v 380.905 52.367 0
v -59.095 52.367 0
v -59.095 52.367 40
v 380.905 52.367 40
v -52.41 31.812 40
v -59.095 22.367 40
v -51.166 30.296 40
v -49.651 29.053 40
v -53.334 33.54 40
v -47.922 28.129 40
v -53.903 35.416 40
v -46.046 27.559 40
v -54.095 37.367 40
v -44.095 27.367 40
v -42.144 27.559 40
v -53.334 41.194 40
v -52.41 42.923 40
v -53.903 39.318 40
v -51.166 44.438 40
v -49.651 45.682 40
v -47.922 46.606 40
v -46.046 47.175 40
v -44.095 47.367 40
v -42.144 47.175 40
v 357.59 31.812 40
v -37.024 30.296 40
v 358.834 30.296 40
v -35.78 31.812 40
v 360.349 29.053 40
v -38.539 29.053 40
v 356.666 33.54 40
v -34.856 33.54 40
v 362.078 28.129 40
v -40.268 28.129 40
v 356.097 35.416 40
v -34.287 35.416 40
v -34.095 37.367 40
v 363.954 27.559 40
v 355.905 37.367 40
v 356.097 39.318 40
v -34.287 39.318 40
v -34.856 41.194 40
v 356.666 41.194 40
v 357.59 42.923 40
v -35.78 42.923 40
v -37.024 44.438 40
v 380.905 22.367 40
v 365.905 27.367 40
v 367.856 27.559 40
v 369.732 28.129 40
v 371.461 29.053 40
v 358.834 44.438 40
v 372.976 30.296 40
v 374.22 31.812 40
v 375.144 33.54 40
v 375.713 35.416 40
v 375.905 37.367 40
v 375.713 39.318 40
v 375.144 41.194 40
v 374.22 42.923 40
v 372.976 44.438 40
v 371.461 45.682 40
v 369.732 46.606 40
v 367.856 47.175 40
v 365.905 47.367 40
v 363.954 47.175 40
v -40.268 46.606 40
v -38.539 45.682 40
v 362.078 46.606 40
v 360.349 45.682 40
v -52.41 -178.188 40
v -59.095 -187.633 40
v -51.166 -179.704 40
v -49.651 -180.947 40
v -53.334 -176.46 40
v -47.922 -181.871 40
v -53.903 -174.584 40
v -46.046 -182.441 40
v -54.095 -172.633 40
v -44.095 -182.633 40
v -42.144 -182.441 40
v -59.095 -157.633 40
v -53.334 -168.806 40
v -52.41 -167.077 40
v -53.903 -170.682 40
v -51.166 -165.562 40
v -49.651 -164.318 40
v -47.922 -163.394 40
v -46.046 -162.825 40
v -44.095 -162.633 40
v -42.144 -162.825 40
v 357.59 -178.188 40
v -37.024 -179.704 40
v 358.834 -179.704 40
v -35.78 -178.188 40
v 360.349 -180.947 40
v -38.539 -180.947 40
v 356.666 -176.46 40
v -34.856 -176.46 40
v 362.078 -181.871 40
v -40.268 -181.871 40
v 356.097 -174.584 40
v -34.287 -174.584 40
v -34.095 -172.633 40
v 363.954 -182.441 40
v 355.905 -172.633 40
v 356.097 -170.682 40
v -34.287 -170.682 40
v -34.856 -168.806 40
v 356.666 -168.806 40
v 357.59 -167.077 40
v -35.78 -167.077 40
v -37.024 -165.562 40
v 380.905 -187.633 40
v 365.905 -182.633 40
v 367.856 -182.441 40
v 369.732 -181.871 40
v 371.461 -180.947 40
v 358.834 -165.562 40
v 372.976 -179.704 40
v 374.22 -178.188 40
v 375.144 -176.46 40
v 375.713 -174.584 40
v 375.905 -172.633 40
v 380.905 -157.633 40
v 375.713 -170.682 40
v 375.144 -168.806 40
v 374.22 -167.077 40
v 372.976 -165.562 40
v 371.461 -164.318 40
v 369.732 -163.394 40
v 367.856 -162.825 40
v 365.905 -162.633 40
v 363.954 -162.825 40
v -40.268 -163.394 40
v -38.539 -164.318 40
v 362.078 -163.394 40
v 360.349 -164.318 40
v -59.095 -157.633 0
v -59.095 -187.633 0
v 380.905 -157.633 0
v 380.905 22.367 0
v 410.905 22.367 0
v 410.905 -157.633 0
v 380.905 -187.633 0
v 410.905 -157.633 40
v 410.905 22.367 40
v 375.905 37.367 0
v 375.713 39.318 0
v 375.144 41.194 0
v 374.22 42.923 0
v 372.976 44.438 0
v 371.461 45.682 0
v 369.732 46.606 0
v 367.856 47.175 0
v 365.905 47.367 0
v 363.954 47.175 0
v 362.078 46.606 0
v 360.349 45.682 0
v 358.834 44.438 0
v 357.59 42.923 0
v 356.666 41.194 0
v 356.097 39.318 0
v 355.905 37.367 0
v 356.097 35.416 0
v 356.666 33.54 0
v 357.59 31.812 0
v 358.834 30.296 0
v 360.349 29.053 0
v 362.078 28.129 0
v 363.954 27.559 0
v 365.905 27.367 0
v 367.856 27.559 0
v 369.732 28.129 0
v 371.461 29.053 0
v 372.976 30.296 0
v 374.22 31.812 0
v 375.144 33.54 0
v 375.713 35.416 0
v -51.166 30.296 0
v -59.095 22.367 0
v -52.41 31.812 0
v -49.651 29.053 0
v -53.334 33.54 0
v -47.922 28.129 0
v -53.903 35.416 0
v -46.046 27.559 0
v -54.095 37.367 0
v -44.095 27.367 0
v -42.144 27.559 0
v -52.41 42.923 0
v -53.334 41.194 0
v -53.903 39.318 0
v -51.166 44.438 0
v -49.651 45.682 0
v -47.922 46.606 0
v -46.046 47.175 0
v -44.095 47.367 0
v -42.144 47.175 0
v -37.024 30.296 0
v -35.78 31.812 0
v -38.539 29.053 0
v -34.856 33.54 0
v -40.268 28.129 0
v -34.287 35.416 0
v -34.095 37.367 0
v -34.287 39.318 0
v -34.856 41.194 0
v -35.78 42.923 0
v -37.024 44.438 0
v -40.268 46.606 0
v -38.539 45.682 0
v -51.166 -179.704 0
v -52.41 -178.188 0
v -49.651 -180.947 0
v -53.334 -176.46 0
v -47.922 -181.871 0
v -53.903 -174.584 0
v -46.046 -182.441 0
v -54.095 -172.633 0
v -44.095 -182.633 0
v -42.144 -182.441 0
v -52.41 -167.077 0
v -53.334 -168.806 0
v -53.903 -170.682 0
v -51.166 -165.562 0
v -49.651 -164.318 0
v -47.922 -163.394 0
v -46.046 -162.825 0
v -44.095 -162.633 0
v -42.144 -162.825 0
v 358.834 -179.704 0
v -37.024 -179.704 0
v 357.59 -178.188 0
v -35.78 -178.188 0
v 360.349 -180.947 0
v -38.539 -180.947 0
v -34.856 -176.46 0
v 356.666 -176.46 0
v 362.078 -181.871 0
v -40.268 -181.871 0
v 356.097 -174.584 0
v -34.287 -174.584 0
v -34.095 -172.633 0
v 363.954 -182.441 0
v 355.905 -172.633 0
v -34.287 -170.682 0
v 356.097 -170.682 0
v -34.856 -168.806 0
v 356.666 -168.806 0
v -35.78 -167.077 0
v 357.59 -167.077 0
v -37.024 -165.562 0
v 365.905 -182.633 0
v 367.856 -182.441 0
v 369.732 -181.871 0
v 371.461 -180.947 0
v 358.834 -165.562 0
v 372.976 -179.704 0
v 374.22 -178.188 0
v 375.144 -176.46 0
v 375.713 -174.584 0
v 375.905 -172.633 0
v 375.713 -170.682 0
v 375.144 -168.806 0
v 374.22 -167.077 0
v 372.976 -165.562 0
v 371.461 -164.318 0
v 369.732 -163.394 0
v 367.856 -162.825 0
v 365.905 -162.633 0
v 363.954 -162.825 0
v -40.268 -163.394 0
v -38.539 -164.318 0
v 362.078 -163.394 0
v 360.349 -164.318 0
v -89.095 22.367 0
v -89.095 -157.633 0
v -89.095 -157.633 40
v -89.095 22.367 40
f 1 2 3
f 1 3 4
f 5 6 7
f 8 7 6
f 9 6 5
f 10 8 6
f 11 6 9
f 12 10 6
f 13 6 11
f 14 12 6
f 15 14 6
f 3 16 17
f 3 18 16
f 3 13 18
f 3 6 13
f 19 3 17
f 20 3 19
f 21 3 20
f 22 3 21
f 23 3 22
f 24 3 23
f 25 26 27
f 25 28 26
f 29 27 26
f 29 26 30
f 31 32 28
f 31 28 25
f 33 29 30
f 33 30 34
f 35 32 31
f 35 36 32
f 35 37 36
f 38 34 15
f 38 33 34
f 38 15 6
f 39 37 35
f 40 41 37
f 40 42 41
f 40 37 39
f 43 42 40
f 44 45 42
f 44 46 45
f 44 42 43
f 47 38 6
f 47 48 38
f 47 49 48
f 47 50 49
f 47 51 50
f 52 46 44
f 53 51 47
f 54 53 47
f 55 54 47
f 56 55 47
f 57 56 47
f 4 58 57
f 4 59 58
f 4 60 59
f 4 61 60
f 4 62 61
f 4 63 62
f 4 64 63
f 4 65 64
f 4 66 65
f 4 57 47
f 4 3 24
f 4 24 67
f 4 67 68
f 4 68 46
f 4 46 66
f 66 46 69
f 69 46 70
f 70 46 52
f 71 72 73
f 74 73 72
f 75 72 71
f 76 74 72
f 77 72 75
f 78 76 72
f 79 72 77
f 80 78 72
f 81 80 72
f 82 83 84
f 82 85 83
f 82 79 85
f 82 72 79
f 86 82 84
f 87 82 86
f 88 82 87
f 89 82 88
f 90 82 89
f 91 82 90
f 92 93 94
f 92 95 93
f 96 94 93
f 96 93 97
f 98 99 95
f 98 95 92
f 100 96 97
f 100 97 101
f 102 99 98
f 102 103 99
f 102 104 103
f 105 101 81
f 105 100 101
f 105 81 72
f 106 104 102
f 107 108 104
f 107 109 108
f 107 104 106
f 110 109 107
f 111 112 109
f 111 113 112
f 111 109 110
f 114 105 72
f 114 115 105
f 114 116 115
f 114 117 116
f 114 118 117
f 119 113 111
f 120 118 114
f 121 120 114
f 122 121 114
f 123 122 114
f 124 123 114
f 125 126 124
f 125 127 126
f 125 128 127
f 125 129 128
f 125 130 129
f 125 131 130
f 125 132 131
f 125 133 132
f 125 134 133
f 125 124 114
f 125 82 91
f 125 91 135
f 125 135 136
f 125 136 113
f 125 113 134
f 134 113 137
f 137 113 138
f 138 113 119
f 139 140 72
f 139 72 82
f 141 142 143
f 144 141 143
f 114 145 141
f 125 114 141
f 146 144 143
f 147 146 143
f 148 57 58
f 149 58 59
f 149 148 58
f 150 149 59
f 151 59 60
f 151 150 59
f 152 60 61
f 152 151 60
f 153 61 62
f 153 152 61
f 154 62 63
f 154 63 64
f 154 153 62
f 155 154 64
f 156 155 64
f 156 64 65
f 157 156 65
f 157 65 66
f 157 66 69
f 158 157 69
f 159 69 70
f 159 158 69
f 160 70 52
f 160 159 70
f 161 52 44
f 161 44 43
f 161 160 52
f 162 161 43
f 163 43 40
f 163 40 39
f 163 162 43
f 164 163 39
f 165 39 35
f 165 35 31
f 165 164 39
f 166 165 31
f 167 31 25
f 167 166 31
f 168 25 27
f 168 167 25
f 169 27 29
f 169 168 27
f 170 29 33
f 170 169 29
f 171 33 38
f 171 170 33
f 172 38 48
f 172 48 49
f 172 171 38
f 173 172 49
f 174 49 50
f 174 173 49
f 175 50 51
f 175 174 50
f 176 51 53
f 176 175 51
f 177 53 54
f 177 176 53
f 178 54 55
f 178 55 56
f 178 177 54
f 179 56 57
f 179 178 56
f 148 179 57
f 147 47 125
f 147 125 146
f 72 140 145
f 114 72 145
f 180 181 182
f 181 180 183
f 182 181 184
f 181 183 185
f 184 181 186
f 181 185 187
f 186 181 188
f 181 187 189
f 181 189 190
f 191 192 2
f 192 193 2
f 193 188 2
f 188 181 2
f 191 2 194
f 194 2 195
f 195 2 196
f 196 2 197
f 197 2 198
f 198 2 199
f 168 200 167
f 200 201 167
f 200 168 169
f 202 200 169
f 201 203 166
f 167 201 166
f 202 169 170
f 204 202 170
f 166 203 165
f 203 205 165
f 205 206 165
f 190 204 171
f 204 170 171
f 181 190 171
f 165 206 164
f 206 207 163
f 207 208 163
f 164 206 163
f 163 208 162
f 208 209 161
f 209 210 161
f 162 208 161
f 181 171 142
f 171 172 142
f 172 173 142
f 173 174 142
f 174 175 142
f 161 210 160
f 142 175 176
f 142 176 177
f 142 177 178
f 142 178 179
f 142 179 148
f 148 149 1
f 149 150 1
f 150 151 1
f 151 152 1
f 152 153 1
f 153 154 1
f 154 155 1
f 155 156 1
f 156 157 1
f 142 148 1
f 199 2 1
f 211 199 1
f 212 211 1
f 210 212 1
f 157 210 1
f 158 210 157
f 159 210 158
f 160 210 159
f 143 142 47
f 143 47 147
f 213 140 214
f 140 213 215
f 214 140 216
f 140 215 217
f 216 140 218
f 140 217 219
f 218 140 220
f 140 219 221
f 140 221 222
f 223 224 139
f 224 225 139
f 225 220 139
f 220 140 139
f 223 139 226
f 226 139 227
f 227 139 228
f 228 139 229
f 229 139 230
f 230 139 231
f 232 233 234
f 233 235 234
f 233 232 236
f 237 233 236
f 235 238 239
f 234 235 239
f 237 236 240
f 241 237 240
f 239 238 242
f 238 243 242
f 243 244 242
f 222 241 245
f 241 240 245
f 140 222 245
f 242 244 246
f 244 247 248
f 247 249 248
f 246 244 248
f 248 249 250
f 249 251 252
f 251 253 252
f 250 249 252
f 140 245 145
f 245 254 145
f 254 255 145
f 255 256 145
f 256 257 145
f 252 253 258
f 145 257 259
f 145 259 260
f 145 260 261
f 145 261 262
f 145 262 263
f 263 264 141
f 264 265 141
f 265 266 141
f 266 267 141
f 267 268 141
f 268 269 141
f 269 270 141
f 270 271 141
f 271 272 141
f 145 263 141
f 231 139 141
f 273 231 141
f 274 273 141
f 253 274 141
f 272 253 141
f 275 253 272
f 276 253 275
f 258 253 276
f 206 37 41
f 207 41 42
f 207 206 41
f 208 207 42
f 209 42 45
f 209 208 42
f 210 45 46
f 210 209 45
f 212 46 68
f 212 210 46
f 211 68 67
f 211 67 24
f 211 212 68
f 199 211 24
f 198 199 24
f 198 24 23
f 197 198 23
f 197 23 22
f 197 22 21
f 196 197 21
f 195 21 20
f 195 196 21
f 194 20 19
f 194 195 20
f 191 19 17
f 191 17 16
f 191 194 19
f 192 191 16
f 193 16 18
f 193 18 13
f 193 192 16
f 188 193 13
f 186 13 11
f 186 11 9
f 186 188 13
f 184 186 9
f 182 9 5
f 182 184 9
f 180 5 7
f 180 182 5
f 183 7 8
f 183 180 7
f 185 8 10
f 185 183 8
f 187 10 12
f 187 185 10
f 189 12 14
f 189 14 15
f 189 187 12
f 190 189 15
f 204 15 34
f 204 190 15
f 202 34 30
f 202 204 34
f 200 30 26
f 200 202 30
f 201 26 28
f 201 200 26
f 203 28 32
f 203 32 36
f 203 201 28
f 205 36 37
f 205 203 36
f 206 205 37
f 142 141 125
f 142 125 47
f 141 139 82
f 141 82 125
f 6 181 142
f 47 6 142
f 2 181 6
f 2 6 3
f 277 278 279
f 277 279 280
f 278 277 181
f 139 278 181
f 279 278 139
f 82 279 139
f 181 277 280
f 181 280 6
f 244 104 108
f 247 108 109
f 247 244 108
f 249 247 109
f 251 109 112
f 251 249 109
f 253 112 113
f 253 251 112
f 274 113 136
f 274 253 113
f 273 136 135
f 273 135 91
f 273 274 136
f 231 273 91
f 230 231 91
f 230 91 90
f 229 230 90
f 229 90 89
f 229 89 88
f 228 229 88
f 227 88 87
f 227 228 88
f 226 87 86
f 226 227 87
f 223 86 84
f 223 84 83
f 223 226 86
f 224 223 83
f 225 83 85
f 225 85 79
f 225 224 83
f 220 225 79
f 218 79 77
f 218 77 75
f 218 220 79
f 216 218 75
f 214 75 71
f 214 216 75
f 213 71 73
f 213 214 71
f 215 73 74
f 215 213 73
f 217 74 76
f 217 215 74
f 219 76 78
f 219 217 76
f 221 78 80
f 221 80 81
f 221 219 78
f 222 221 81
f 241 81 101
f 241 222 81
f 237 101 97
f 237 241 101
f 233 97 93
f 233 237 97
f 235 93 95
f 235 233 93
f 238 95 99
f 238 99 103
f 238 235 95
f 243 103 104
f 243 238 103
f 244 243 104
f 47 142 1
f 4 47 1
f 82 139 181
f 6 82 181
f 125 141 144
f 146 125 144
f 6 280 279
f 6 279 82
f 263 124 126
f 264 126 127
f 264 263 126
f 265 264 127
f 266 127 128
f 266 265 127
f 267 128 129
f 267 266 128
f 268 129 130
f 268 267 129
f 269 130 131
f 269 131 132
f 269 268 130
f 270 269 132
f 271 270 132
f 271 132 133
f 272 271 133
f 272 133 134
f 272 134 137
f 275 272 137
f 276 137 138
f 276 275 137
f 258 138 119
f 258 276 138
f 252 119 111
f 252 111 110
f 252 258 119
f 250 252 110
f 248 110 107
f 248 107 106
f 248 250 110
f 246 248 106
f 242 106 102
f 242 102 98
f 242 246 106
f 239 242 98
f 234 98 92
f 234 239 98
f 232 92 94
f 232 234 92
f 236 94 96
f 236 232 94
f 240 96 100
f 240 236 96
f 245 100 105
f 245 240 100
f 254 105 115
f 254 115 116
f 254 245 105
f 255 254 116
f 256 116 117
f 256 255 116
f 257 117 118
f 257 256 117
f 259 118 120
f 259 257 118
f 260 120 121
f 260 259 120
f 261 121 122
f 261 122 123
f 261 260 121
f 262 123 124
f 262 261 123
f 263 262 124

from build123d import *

# Parameters (mm, degrees)
SKETCH_1_W        = 440
SKETCH_1_H        = 30
SKETCH_1_R        = 10
EXTRUDE_3_DEPTH   = 40
SKETCH_1_W_2      = 30
SKETCH_1_H_2      = 180
EXTRUDE_3_2_DEPTH = 40
EXTRUDE_3_3_DEPTH = 40
EXTRUDE_3_4_DEPTH = 40


with BuildPart() as part:
    # 草图1 → 凸台-拉伸3 (new body)
    with BuildSketch(Plane.XY):
        with Locations((160.904830227, 37.367321225)):
            Rectangle(SKETCH_1_W, SKETCH_1_H)
        with Locations((365.904830227, 37.367321225)):
            Circle(SKETCH_1_R, mode=Mode.SUBTRACT)
        with Locations((-44.095169773, 37.367321225)):
            Circle(SKETCH_1_R, mode=Mode.SUBTRACT)
    extrude(amount=EXTRUDE_3_DEPTH)


with BuildPart() as body_2:
    # 草图1 → Extrude 3 2 (new body)
    with BuildSketch(Plane.XY):
        with Locations((-74.095169773, -67.632678775)):
            Rectangle(SKETCH_1_W_2, SKETCH_1_H_2)
    extrude(amount=EXTRUDE_3_2_DEPTH)


with BuildPart() as body_3:
    # 草图1 → Extrude 3 3 (new body)
    with BuildSketch(Plane.XY):
        with Locations((395.904830227, -67.632678775)):
            Rectangle(SKETCH_1_W_2, SKETCH_1_H_2)
    extrude(amount=EXTRUDE_3_3_DEPTH)


with BuildPart() as body_4:
    # 草图1 → Extrude 3 4 (new body)
    with BuildSketch(Plane.XY):
        with Locations((160.904830227, -172.632678775)):
            Rectangle(SKETCH_1_W, SKETCH_1_H)
        with Locations((-44.095169773, -172.632678775)):
            Circle(SKETCH_1_R, mode=Mode.SUBTRACT)
        with Locations((365.904830227, -172.632678775)):
            Circle(SKETCH_1_R, mode=Mode.SUBTRACT)
    extrude(amount=EXTRUDE_3_4_DEPTH)


solid = Compound([part.part, body_2.part, body_3.part, body_4.part])
